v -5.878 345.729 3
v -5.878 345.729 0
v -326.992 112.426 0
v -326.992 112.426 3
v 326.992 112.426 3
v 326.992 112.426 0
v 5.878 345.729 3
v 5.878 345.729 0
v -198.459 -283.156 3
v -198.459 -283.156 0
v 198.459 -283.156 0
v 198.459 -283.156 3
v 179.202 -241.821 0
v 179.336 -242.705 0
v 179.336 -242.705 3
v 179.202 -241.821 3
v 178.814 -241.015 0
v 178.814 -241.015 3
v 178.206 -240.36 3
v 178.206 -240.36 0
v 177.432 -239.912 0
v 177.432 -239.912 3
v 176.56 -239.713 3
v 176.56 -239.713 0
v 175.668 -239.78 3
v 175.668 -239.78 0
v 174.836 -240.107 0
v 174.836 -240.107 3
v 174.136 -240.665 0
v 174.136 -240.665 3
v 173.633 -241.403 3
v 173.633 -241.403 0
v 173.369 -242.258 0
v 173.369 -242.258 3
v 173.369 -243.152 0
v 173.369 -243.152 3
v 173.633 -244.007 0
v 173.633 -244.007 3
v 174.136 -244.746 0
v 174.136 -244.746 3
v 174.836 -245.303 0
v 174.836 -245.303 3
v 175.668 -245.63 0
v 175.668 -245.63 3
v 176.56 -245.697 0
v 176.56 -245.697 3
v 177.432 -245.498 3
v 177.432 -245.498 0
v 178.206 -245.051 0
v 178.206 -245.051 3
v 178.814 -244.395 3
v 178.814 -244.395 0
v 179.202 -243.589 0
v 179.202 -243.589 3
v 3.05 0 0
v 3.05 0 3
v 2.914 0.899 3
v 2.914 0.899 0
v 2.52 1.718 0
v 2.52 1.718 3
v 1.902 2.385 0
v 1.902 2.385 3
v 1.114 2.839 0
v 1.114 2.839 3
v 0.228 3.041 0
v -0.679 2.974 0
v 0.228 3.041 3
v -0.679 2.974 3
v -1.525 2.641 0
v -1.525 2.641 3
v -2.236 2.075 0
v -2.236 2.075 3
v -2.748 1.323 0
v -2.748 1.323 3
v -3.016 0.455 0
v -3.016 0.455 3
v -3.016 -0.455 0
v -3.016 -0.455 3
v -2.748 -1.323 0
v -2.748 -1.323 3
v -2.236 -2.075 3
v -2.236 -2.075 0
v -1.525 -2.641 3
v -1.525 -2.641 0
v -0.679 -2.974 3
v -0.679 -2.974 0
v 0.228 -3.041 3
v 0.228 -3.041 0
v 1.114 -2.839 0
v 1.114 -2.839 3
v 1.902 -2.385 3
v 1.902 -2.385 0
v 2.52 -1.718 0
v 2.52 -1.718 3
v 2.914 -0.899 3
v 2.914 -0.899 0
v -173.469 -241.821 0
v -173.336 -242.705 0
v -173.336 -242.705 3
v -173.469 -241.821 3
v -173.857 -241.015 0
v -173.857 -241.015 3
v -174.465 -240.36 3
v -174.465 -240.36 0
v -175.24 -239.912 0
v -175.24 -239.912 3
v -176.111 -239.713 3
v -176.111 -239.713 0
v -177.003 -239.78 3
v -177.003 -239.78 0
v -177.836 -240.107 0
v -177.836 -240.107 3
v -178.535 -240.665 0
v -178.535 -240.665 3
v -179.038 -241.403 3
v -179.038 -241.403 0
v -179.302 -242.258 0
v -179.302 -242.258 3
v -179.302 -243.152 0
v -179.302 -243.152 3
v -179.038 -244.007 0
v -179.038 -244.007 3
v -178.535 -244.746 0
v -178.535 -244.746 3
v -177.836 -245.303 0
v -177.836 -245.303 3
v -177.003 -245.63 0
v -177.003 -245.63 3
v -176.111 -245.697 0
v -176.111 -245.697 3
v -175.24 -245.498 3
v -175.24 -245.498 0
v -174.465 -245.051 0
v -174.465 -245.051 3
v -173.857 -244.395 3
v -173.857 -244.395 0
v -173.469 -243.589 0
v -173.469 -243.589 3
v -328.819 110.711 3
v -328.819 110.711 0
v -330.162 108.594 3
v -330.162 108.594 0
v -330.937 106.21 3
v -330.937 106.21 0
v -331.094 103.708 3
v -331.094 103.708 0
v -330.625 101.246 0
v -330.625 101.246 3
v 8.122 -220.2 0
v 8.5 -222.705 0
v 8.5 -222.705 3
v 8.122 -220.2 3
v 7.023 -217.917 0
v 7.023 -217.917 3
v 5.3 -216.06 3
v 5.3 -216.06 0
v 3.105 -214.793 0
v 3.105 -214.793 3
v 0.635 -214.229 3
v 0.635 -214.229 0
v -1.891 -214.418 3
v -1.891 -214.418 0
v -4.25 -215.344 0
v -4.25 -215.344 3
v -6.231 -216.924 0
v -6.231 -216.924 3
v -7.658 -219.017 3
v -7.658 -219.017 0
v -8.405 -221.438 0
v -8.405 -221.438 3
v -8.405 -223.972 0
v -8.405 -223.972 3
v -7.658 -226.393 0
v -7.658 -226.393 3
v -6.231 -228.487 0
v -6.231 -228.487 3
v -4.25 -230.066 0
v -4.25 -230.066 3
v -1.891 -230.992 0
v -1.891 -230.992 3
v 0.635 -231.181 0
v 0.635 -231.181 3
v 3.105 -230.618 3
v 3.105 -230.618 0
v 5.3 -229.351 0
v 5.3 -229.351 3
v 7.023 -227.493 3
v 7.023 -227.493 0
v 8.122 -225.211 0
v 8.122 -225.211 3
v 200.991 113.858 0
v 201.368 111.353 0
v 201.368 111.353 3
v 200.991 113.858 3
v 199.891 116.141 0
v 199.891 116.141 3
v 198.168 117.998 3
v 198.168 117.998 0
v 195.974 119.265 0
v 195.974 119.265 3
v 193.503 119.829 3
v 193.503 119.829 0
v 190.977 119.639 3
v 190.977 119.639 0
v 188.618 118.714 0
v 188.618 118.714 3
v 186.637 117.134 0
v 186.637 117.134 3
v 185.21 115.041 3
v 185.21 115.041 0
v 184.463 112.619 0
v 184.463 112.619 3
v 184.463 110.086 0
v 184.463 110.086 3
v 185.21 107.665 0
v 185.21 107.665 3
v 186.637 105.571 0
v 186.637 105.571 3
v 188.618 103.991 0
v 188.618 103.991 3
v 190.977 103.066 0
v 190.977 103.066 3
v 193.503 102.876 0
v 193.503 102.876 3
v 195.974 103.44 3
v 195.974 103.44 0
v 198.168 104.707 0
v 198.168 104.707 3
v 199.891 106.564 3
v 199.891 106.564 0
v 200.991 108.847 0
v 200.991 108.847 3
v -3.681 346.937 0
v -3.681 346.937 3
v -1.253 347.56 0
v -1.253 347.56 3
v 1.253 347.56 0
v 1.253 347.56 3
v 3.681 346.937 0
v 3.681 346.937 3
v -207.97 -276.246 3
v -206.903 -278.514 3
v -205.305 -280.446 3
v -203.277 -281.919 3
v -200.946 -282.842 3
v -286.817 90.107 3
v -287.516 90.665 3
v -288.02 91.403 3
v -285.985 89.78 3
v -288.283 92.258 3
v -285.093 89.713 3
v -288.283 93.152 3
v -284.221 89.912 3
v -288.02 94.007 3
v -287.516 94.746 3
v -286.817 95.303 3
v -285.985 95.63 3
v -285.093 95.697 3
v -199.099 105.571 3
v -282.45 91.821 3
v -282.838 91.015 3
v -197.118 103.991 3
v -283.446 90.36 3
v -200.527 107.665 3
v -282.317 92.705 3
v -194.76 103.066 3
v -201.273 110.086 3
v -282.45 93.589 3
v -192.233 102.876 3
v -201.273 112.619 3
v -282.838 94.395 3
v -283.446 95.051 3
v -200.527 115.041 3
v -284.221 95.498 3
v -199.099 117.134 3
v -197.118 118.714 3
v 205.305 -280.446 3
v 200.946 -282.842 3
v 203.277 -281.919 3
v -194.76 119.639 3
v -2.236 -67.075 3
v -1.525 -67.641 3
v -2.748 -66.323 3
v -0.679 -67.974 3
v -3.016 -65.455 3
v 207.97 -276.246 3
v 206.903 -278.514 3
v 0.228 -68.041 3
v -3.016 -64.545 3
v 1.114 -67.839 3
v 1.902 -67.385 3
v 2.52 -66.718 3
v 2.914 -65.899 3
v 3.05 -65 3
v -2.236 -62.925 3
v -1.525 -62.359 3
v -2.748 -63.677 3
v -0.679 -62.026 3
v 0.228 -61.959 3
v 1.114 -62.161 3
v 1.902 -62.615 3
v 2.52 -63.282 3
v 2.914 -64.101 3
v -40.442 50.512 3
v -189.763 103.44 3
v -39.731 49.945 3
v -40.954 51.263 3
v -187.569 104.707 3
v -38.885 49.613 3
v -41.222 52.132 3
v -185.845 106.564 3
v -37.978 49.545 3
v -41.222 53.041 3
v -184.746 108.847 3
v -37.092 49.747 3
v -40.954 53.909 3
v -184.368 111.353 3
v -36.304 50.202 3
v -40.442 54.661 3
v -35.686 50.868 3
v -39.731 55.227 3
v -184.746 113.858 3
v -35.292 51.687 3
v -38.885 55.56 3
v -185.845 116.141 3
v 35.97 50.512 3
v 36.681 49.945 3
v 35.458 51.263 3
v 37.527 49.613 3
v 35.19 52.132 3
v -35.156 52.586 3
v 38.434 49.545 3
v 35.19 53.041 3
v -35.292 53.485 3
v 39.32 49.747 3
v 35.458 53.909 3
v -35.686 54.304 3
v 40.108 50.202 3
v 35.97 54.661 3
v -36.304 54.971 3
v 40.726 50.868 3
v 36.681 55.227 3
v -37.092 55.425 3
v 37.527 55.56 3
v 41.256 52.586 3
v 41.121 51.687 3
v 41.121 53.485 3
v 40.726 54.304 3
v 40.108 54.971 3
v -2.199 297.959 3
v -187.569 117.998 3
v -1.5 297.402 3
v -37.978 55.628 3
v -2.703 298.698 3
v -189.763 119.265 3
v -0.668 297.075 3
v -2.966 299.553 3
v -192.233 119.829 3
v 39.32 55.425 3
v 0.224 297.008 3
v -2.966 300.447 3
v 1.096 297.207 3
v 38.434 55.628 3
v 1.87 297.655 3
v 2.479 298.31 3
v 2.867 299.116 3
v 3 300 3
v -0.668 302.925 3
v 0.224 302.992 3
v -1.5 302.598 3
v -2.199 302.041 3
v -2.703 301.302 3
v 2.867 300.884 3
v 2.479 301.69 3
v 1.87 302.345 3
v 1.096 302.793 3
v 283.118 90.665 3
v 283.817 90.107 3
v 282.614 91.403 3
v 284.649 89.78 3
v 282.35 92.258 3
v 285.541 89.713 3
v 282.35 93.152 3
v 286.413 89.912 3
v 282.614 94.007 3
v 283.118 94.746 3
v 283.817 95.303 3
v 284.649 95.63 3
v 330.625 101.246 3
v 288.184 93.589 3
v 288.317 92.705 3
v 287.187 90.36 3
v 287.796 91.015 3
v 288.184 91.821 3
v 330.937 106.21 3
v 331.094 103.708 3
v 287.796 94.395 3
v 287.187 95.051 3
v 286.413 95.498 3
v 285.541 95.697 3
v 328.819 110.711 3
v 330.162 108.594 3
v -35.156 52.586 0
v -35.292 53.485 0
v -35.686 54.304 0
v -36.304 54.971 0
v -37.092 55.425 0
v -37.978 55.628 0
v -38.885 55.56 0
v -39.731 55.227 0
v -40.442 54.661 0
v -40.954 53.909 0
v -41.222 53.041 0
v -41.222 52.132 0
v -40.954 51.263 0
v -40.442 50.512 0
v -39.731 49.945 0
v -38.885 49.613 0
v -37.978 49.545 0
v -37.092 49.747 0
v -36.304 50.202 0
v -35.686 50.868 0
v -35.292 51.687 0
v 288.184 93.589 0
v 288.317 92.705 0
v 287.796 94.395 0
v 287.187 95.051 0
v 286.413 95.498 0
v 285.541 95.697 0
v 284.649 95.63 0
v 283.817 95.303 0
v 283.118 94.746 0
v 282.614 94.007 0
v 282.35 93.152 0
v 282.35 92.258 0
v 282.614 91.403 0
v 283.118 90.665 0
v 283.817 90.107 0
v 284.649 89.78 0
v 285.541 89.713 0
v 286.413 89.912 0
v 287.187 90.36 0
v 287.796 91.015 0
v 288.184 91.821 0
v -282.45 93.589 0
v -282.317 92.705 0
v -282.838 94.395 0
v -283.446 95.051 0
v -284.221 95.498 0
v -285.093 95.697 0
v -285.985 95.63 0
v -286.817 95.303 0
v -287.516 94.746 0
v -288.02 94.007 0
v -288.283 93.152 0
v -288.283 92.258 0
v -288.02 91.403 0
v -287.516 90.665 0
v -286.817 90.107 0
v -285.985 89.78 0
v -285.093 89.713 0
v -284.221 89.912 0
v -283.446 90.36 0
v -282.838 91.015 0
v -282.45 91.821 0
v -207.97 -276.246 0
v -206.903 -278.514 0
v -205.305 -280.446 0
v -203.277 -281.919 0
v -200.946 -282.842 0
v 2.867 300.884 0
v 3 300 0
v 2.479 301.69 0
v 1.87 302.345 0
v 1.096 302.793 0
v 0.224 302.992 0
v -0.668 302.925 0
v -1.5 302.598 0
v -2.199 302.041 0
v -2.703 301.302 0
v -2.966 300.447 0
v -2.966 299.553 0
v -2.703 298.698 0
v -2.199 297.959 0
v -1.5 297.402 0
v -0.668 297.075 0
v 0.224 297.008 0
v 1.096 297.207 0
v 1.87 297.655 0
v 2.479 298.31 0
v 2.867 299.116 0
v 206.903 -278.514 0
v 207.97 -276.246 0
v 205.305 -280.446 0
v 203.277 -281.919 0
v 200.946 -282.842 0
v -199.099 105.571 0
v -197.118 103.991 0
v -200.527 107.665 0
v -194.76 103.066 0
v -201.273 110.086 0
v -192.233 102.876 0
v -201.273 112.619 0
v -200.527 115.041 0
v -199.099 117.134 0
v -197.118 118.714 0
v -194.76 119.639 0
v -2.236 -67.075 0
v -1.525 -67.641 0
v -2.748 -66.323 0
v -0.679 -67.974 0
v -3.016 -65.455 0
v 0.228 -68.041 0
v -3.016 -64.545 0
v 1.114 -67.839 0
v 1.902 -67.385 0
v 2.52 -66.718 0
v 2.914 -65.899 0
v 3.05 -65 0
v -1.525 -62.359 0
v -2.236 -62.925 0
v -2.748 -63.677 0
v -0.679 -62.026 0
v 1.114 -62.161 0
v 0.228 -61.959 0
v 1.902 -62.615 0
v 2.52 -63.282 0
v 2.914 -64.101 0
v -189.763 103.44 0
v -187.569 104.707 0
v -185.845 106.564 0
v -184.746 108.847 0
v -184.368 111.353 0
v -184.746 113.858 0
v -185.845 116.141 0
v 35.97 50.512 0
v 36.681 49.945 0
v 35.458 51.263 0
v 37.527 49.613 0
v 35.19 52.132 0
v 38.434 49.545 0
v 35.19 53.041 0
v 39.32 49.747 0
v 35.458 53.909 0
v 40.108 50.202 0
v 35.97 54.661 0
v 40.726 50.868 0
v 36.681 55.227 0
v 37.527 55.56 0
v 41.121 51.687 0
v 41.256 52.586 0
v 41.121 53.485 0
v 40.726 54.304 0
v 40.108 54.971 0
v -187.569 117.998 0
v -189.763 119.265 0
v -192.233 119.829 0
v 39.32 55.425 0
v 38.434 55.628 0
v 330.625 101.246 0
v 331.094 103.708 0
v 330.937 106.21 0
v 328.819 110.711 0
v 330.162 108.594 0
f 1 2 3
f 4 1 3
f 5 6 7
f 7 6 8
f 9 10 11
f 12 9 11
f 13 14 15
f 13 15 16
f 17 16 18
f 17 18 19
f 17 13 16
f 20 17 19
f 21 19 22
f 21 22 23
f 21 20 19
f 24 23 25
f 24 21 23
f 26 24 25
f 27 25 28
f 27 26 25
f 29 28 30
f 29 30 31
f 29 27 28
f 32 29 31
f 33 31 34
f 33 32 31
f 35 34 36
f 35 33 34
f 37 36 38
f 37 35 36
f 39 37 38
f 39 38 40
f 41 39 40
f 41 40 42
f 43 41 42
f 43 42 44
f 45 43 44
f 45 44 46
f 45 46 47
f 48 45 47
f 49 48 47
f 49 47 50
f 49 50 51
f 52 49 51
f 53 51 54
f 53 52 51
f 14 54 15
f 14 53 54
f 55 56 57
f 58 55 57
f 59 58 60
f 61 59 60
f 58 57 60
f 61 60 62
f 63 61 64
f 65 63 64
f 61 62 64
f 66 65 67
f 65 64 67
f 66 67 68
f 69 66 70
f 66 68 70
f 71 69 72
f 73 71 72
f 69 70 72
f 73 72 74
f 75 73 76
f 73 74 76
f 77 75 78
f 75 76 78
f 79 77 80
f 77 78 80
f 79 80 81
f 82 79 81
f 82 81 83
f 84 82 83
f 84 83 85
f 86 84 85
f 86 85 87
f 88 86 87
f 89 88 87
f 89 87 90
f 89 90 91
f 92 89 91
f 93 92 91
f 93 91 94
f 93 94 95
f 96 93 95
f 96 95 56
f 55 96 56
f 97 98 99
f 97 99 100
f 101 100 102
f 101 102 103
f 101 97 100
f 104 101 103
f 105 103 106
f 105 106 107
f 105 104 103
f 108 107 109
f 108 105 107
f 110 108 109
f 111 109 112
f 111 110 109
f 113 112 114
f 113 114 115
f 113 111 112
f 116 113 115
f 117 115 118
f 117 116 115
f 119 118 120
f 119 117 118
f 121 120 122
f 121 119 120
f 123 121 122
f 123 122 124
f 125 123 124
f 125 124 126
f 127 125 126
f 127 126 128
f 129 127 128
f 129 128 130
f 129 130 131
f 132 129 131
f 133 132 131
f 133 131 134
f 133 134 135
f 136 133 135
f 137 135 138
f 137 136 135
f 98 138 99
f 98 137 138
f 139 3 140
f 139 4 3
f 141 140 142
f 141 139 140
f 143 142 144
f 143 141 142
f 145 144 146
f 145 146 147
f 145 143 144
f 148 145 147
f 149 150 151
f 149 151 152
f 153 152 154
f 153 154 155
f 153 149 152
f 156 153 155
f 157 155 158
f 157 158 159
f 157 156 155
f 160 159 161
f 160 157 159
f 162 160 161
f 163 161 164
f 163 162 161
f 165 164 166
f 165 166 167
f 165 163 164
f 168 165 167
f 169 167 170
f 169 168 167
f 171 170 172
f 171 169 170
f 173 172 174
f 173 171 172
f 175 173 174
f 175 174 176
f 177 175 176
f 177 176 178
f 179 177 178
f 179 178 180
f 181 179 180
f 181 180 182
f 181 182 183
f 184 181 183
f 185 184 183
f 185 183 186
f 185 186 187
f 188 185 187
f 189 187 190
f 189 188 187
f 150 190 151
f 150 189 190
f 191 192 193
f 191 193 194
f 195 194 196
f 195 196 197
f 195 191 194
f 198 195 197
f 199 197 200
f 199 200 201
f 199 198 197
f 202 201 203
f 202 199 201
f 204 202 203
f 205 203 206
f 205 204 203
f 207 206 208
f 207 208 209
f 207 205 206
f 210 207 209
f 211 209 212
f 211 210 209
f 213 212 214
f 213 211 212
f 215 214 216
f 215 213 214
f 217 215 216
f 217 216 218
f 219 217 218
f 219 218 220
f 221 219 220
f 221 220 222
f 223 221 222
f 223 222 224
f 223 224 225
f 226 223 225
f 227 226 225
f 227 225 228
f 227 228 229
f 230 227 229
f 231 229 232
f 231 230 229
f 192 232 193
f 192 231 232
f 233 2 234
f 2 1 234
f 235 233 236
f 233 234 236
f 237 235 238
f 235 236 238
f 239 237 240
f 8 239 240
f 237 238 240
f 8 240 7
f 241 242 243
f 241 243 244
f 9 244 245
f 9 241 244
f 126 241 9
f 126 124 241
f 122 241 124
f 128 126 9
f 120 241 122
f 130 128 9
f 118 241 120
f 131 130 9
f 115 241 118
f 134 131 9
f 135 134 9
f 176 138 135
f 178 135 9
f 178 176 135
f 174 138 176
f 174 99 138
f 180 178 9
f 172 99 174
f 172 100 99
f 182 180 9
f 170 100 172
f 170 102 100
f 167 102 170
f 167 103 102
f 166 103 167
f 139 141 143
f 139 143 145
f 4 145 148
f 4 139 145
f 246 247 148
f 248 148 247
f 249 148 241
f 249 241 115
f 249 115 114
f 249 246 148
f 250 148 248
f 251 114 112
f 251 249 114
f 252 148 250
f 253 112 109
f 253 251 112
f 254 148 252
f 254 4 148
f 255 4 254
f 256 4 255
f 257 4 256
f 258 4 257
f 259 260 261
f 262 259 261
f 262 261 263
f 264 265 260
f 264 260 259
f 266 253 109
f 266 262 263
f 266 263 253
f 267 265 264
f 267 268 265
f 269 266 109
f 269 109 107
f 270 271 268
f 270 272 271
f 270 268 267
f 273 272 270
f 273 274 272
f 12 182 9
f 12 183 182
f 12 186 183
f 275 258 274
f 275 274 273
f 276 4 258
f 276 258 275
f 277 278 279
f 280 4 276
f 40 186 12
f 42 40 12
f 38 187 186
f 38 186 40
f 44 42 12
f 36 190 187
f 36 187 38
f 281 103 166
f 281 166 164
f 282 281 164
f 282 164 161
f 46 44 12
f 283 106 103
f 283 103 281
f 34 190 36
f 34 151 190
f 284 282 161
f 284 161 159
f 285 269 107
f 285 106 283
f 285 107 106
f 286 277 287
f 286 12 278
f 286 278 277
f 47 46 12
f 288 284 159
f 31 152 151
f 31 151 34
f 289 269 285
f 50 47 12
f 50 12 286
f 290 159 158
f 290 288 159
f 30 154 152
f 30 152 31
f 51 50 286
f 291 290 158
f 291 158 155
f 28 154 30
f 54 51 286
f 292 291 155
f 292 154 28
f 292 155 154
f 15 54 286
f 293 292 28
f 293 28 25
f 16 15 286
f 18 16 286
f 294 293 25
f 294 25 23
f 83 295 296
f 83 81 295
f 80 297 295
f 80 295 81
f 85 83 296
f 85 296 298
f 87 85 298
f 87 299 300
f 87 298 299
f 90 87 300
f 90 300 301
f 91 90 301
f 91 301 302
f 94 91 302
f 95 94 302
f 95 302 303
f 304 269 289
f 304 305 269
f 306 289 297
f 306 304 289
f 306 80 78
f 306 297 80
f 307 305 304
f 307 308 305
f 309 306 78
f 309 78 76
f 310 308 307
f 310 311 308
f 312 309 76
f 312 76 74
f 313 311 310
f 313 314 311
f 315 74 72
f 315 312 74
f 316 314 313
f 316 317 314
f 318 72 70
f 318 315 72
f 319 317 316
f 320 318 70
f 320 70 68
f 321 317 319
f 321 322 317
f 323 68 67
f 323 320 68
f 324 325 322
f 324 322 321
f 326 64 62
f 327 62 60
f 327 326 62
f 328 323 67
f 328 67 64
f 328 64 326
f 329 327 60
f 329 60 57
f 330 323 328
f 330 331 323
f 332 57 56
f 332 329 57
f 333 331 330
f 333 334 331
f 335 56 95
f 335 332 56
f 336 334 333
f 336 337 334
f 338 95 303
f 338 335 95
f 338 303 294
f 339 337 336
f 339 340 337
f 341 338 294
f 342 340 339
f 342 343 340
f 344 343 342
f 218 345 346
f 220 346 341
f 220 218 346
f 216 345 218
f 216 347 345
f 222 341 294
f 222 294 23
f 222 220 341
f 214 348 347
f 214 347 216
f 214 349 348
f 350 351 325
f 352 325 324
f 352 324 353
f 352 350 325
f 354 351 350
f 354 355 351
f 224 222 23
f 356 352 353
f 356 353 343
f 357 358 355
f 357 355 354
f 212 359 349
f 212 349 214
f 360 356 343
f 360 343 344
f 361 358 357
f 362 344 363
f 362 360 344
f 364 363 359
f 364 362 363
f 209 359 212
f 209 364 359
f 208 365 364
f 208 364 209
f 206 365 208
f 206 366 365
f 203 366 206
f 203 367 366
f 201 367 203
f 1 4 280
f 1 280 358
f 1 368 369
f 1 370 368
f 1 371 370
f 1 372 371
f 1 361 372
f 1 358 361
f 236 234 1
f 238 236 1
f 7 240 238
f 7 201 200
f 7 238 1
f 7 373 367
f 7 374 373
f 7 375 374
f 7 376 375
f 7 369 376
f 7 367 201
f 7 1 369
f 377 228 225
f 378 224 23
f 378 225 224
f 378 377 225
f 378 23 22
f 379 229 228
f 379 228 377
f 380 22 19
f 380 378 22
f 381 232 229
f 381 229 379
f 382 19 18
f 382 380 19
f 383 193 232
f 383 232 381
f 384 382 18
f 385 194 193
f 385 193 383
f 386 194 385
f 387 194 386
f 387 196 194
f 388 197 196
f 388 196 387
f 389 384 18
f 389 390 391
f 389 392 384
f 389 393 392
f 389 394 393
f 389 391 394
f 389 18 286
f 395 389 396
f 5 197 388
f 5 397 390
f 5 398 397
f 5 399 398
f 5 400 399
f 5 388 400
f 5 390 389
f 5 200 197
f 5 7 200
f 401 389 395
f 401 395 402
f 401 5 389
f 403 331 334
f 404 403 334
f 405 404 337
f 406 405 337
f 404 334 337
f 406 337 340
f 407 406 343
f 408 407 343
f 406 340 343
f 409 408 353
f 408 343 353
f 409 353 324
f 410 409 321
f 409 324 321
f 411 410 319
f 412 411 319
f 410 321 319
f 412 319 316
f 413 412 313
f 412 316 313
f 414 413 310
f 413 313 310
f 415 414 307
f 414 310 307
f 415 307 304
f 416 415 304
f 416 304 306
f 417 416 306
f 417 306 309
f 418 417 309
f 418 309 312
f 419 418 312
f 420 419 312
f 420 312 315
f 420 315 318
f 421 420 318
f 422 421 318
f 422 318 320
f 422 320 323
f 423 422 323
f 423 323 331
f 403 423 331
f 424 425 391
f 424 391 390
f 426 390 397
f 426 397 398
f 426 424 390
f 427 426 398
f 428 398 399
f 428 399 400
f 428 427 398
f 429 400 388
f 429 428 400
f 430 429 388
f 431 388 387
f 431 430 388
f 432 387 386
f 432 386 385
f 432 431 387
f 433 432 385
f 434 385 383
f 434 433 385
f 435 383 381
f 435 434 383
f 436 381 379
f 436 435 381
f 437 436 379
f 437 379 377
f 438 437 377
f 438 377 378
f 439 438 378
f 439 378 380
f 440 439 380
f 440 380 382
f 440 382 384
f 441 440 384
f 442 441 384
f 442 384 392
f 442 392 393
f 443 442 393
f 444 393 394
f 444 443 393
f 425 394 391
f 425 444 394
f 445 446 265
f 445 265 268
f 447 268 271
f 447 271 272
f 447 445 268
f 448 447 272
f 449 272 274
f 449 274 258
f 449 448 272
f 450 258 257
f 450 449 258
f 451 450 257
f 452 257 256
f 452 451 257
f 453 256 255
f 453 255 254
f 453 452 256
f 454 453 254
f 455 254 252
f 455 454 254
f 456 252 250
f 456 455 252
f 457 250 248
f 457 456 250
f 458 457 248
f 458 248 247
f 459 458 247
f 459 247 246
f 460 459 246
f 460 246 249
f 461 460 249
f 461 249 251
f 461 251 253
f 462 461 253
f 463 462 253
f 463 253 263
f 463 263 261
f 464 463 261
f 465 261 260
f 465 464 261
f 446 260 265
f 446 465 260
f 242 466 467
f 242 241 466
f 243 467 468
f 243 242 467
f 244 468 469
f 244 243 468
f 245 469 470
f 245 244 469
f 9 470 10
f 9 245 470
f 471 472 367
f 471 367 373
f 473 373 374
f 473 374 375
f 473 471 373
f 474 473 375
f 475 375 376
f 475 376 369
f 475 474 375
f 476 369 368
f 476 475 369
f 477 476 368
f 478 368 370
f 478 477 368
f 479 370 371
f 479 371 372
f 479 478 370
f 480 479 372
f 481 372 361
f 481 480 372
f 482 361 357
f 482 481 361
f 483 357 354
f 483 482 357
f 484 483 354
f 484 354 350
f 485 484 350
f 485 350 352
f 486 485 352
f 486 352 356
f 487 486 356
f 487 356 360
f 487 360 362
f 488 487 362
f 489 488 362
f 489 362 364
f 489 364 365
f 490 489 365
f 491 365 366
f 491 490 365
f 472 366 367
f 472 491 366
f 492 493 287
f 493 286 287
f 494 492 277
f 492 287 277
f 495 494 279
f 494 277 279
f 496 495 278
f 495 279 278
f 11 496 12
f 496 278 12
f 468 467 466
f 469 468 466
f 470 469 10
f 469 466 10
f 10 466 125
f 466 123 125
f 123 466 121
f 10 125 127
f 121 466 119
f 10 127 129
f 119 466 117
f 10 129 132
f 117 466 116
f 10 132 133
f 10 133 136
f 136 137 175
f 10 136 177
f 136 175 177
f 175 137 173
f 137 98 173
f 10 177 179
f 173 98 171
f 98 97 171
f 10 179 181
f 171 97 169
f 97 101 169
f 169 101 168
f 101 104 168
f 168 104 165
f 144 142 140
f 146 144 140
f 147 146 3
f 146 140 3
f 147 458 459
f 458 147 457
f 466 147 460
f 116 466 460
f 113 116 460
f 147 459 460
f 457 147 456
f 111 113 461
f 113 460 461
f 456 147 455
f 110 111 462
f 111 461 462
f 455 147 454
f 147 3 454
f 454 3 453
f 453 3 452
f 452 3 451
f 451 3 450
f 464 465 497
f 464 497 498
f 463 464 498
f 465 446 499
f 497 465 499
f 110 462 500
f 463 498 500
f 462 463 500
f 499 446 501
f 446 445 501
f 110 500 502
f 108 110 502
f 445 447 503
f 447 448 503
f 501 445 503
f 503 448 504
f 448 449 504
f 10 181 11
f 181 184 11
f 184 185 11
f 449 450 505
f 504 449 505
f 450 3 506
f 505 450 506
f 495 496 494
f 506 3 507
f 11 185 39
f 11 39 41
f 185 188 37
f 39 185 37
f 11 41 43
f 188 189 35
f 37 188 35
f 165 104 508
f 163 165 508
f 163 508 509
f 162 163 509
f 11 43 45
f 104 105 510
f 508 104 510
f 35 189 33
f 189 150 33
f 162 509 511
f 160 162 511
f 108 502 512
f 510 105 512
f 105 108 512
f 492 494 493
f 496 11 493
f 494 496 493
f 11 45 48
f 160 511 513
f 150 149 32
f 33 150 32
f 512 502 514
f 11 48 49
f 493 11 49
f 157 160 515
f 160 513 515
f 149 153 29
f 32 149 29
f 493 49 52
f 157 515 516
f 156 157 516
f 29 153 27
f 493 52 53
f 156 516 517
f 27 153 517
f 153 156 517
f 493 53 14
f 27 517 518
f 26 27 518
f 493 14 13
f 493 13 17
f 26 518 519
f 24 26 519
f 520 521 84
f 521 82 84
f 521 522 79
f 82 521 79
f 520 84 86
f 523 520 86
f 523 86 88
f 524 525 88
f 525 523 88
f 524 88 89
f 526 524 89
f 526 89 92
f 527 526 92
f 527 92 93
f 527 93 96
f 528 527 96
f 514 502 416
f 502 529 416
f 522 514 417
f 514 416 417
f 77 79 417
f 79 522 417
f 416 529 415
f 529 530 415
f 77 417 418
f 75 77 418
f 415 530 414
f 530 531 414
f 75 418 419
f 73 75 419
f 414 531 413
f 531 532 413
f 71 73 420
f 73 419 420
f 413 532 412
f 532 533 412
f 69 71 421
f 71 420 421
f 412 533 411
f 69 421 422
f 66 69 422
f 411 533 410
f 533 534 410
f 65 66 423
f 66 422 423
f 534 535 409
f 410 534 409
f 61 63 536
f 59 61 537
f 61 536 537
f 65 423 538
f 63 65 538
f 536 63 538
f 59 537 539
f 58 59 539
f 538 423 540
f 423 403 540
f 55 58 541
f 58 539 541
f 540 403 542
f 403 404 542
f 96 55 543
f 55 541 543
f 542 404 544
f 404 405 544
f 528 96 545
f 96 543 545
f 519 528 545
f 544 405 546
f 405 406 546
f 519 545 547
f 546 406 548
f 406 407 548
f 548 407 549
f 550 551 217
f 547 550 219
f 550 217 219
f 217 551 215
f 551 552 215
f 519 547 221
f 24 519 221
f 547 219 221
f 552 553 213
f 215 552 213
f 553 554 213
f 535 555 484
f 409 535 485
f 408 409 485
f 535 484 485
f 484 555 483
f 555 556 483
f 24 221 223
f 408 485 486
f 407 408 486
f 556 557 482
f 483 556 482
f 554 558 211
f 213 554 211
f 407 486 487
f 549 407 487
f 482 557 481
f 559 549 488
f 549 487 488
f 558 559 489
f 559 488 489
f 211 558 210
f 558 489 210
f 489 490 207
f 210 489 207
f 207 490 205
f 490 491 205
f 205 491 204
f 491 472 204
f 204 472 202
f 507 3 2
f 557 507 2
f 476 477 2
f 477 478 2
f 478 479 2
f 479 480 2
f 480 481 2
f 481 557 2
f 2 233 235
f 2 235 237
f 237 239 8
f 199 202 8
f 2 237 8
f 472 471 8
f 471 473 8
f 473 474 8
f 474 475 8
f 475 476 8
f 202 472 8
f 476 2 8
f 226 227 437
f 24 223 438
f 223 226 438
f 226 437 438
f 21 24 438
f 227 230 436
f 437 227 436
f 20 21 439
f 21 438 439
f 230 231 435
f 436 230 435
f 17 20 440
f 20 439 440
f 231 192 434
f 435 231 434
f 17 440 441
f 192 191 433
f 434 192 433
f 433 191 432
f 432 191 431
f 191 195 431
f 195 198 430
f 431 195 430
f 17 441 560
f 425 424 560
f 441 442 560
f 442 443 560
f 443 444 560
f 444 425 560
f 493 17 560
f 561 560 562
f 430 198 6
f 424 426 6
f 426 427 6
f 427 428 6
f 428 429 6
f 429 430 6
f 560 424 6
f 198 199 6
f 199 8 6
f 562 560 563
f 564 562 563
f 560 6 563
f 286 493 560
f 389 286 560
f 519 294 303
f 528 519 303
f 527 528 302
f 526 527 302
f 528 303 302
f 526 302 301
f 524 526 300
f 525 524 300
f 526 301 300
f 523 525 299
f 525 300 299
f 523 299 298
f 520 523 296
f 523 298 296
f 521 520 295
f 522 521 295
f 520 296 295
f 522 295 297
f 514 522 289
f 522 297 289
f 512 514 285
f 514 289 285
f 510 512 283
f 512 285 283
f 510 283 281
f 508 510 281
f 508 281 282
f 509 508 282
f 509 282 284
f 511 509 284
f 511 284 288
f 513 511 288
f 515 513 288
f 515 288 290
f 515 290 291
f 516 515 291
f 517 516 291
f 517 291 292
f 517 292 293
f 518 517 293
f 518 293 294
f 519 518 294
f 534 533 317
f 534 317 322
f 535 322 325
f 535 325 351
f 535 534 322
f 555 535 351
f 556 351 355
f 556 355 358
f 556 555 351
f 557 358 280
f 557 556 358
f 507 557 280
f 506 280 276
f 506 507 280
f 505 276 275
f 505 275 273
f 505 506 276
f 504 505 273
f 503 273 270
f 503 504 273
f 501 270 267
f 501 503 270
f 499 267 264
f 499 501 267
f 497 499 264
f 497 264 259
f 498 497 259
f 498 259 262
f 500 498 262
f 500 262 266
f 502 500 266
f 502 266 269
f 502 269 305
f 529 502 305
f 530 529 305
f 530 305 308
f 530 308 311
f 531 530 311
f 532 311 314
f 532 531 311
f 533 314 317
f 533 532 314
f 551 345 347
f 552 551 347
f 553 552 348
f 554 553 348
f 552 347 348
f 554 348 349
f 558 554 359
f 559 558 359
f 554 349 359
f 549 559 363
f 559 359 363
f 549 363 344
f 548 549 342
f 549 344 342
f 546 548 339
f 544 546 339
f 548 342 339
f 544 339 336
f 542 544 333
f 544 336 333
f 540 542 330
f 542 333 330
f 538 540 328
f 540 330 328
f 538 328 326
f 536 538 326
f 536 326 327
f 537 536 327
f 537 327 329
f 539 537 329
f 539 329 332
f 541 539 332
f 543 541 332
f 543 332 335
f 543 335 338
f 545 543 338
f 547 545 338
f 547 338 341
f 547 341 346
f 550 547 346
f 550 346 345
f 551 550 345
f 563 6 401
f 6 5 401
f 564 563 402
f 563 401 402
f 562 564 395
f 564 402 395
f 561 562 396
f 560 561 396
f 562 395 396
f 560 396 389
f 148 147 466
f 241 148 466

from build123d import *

# Parameters (mm, degrees)
SKETCH_R    = 8.5
SKETCH_R_2  = 3
PAD_DEPTH   = 3
SKETCH001_R = 3.05
HOLE_DEPTH  = 3.001
FILLET_R    = 10


with BuildPart() as part:
    # Sketch → Pad (new body)
    with BuildSketch(Plane.XY):
        Polygon((0, 350), (-332.869781, 108.155948), (-205.724838, -283.155948), (205.724838, -283.155948), (332.869781, 108.155948), align=None)
        with Locations((0, -222.705098)):
            Circle(SKETCH_R, mode=Mode.SUBTRACT)
        with Locations((-192.868273, 111.352549)):
            Circle(SKETCH_R, mode=Mode.SUBTRACT)
        with Locations((192.868273, 111.352549)):
            Circle(SKETCH_R, mode=Mode.SUBTRACT)
        with Locations((-176.335576, -242.705098)):
            Circle(SKETCH_R_2, mode=Mode.SUBTRACT)
        with Locations((176.335576, -242.705098)):
            Circle(SKETCH_R_2, mode=Mode.SUBTRACT)
        with Locations((285.316955, 92.705098)):
            Circle(SKETCH_R_2, mode=Mode.SUBTRACT)
        with Locations((-285.316955, 92.705098)):
            Circle(SKETCH_R_2, mode=Mode.SUBTRACT)
        with Locations((0, 300)):
            Circle(SKETCH_R_2, mode=Mode.SUBTRACT)
    extrude(amount=PAD_DEPTH)

    # Sketch001 (on Face15 of Pad) → Hole (cut, through all)
    with BuildSketch(Plane.XY.offset(3)):
        with Locations((-38.206041, 52.586105)):
            Circle(SKETCH001_R)
        with Locations((38.206041, 52.586105)):
            Circle(SKETCH001_R)
        with Locations((0, -65)):
            Circle(SKETCH001_R)
        Circle(SKETCH001_R)
    extrude(amount=-HOLE_DEPTH, mode=Mode.SUBTRACT)

    # Fillet
    fillet_edges = [part.edges().sort_by_distance(p)[0] for p in [
        (-332.869781, 108.155948, 1.5),
        (0, 350, 1.5),
        (332.869781, 108.155948, 1.5),
        (205.724838, -283.155948, 1.5),
        (-205.724838, -283.155948, 1.5),
    ]]
    fillet(fillet_edges, radius=FILLET_R)


solid = part.part
